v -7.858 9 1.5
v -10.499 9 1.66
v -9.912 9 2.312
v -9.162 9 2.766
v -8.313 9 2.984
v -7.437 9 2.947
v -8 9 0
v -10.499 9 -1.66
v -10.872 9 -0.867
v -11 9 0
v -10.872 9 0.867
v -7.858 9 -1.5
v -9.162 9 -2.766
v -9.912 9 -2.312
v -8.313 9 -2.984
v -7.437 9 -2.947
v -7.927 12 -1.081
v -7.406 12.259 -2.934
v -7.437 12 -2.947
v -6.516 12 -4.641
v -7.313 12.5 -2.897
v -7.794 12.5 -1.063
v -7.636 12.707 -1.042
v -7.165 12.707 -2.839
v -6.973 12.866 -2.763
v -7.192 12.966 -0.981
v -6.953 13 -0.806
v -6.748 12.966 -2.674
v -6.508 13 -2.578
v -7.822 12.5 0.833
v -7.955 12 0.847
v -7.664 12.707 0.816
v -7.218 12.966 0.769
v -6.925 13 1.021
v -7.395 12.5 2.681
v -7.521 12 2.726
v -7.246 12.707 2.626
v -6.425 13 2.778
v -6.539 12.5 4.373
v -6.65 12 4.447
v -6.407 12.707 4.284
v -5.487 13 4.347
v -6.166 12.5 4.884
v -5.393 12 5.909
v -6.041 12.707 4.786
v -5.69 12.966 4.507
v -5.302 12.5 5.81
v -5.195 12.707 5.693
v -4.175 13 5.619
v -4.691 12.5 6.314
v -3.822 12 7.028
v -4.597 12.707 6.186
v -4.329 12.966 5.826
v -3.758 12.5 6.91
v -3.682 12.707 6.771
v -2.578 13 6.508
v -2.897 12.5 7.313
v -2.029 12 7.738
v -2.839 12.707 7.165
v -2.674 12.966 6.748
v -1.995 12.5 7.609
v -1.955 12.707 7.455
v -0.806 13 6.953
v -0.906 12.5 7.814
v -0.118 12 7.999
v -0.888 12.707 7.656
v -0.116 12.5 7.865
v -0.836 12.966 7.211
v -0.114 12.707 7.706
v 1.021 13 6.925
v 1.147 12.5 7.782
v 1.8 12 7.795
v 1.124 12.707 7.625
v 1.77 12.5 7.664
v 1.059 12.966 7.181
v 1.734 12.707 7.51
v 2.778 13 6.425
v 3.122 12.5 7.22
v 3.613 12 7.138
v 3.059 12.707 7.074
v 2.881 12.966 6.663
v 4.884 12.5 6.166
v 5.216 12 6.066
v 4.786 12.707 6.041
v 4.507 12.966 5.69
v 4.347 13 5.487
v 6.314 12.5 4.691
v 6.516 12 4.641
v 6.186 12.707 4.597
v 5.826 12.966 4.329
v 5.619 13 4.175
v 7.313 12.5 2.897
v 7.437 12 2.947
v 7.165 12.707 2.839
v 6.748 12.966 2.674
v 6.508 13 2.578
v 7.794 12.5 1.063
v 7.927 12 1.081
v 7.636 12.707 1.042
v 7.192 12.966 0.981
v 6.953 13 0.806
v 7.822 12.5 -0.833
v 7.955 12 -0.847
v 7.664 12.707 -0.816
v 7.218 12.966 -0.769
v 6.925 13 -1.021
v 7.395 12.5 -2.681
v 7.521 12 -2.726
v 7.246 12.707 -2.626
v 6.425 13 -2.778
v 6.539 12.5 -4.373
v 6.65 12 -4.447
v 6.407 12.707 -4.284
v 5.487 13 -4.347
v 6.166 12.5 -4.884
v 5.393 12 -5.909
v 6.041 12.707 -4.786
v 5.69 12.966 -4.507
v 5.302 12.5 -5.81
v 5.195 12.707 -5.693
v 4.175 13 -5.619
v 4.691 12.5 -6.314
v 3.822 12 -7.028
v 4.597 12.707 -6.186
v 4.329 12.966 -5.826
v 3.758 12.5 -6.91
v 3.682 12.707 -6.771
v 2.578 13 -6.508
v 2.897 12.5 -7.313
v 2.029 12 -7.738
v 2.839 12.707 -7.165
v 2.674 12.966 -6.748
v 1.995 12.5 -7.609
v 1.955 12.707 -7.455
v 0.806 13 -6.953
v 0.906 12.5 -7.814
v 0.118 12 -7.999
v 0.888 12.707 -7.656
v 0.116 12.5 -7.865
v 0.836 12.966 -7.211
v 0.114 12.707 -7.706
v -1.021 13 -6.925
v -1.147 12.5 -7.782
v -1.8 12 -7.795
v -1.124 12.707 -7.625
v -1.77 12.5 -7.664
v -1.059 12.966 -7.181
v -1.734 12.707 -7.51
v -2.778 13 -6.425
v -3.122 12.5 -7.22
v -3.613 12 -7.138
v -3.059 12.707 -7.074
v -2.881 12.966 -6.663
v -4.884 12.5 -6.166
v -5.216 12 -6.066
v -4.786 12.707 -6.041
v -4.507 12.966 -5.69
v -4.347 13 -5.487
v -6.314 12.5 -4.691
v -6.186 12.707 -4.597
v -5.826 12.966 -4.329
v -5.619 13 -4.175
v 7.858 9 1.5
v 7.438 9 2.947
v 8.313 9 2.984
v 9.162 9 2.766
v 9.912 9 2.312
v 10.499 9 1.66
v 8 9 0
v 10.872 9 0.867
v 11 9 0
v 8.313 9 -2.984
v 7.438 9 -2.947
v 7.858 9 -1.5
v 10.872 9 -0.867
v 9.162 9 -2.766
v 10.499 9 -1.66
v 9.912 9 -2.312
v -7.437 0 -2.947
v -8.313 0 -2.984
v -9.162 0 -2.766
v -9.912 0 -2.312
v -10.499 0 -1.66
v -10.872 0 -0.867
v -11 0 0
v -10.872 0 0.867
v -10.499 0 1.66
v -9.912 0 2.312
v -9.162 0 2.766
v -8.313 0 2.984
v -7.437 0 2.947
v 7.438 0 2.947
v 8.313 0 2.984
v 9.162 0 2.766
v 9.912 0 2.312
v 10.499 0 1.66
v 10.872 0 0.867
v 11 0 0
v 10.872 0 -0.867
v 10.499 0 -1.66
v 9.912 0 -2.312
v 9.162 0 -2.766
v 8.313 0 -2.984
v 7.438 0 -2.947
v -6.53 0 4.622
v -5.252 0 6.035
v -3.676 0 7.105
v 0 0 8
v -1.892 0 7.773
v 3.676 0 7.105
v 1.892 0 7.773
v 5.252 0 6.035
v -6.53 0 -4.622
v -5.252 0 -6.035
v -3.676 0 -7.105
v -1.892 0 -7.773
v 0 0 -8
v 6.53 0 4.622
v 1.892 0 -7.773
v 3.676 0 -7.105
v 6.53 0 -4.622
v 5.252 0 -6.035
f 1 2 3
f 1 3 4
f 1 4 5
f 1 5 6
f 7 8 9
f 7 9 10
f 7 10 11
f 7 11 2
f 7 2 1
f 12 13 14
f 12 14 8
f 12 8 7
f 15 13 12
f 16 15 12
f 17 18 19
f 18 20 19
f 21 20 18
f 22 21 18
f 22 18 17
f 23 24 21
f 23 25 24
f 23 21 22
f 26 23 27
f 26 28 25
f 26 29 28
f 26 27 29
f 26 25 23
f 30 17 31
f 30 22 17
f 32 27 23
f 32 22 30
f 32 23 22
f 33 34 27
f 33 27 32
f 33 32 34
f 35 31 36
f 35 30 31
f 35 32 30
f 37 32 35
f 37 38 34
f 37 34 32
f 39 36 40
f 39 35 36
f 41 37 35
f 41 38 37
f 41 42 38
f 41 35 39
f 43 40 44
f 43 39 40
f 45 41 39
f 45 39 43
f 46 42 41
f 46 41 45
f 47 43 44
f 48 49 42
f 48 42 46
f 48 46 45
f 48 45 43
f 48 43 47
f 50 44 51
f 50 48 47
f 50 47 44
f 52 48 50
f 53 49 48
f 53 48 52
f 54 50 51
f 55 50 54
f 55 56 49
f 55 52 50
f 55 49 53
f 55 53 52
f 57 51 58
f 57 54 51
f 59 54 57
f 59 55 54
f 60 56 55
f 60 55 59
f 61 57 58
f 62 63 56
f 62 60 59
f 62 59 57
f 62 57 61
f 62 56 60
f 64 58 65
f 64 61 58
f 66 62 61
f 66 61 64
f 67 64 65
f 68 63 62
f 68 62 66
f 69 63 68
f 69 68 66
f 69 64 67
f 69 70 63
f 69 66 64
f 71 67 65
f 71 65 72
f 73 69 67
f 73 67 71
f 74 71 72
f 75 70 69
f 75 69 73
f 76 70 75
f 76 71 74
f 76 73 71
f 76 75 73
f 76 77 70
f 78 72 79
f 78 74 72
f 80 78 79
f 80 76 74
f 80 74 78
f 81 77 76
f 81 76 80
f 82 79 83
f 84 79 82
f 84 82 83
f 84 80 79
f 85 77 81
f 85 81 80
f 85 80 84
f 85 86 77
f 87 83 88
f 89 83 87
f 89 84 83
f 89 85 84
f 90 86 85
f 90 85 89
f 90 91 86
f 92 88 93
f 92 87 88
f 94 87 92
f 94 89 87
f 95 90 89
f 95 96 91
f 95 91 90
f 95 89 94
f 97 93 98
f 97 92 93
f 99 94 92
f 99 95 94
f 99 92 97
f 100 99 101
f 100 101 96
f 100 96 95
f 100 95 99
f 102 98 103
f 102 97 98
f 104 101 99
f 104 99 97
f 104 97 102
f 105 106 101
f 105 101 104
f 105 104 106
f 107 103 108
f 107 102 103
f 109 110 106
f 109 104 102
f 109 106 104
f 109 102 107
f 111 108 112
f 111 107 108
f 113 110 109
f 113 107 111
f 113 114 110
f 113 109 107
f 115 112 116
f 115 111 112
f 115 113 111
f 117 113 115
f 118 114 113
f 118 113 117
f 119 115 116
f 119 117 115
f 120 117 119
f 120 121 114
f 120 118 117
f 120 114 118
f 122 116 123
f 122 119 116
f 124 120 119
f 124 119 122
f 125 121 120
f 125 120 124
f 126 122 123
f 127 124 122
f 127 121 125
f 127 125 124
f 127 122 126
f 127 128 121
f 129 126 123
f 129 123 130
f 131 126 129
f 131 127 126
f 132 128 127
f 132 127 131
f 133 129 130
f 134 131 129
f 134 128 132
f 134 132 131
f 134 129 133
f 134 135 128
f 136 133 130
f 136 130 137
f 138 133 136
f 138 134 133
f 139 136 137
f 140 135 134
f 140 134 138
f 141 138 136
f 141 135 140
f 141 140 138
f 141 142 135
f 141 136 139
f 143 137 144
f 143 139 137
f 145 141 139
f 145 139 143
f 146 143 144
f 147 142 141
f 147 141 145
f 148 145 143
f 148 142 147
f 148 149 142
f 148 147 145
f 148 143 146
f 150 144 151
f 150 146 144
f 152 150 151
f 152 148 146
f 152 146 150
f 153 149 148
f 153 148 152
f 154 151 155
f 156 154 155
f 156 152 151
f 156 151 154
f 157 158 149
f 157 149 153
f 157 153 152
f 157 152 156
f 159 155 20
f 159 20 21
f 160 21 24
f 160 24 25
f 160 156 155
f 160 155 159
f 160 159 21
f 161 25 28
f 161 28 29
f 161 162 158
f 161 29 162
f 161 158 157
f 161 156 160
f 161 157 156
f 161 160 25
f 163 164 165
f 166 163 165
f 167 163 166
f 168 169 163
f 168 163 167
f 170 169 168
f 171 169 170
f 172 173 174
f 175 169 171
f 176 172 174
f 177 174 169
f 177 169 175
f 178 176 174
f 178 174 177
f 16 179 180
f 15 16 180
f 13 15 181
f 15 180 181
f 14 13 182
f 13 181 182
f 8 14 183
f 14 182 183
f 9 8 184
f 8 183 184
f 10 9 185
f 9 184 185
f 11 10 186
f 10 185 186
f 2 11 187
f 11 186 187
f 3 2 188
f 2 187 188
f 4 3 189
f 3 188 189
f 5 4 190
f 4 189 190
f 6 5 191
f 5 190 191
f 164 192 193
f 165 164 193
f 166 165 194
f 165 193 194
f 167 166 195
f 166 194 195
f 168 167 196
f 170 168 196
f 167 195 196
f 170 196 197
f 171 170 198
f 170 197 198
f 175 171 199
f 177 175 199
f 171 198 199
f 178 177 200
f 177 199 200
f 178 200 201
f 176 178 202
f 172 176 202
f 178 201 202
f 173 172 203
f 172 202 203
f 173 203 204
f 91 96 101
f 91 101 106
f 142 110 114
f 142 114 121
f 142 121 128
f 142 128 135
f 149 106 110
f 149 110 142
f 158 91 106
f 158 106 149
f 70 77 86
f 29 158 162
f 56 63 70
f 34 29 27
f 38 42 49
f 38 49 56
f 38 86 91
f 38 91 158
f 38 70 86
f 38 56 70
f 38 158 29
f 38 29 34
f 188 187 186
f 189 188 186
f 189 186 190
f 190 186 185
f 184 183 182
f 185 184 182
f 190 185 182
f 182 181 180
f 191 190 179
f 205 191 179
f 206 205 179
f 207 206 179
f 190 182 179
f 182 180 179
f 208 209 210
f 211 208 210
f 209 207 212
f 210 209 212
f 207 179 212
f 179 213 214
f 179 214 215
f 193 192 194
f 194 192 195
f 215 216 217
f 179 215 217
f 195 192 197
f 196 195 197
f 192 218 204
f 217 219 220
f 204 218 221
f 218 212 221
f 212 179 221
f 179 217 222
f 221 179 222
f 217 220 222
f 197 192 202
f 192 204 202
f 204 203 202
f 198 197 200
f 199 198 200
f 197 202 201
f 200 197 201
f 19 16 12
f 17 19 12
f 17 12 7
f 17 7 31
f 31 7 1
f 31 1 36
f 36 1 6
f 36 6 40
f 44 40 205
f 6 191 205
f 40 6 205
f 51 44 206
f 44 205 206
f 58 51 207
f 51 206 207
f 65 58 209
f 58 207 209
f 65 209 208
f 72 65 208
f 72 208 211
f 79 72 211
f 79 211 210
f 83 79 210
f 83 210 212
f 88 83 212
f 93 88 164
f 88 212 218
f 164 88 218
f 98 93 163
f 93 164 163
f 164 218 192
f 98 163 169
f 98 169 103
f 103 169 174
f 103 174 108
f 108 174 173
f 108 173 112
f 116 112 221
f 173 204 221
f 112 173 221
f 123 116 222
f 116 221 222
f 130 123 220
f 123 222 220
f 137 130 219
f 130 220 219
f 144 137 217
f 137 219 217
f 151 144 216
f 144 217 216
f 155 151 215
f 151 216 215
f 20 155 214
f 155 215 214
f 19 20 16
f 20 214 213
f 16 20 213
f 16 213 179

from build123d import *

# Parameters (mm, degrees)
SKETCH1_R           = 3
SKETCH1_R_2         = 8
BOSS_EXTRUDE1_DEPTH = 9
SKETCH2_R           = 8
BOSS_EXTRUDE2_DEPTH = 4
FILLET1_R           = 1


with BuildPart() as part:
    # Sketch1 → Boss-Extrude1 (new body)
    with BuildSketch(Plane(origin=(0, 0, 0), x_dir=(1, 0, 0), z_dir=(0, 1, 0))):
        with Locations((-8, 0)):
            Circle(SKETCH1_R)
        Circle(SKETCH1_R_2)
        with Locations((8, 0)):
            Circle(SKETCH1_R)
    extrude(amount=BOSS_EXTRUDE1_DEPTH)

    # Sketch2 → Boss-Extrude2 (add)
    with BuildSketch(Plane(origin=(0, 9, 0), x_dir=(1, 0, 0), z_dir=(0, 1, 0))):
        with Locations(Location((0, 0, 0), (0, 0, 158.38615425))):
            Circle(SKETCH2_R)
    extrude(amount=BOSS_EXTRUDE2_DEPTH)

    # Fillet1
    fillet1_edges = [part.edges().sort_by_distance(p)[0] for p in [
        (7.4375, 13, 2.946793809),
    ]]
    fillet(fillet1_edges, radius=FILLET1_R)


solid = part.part
